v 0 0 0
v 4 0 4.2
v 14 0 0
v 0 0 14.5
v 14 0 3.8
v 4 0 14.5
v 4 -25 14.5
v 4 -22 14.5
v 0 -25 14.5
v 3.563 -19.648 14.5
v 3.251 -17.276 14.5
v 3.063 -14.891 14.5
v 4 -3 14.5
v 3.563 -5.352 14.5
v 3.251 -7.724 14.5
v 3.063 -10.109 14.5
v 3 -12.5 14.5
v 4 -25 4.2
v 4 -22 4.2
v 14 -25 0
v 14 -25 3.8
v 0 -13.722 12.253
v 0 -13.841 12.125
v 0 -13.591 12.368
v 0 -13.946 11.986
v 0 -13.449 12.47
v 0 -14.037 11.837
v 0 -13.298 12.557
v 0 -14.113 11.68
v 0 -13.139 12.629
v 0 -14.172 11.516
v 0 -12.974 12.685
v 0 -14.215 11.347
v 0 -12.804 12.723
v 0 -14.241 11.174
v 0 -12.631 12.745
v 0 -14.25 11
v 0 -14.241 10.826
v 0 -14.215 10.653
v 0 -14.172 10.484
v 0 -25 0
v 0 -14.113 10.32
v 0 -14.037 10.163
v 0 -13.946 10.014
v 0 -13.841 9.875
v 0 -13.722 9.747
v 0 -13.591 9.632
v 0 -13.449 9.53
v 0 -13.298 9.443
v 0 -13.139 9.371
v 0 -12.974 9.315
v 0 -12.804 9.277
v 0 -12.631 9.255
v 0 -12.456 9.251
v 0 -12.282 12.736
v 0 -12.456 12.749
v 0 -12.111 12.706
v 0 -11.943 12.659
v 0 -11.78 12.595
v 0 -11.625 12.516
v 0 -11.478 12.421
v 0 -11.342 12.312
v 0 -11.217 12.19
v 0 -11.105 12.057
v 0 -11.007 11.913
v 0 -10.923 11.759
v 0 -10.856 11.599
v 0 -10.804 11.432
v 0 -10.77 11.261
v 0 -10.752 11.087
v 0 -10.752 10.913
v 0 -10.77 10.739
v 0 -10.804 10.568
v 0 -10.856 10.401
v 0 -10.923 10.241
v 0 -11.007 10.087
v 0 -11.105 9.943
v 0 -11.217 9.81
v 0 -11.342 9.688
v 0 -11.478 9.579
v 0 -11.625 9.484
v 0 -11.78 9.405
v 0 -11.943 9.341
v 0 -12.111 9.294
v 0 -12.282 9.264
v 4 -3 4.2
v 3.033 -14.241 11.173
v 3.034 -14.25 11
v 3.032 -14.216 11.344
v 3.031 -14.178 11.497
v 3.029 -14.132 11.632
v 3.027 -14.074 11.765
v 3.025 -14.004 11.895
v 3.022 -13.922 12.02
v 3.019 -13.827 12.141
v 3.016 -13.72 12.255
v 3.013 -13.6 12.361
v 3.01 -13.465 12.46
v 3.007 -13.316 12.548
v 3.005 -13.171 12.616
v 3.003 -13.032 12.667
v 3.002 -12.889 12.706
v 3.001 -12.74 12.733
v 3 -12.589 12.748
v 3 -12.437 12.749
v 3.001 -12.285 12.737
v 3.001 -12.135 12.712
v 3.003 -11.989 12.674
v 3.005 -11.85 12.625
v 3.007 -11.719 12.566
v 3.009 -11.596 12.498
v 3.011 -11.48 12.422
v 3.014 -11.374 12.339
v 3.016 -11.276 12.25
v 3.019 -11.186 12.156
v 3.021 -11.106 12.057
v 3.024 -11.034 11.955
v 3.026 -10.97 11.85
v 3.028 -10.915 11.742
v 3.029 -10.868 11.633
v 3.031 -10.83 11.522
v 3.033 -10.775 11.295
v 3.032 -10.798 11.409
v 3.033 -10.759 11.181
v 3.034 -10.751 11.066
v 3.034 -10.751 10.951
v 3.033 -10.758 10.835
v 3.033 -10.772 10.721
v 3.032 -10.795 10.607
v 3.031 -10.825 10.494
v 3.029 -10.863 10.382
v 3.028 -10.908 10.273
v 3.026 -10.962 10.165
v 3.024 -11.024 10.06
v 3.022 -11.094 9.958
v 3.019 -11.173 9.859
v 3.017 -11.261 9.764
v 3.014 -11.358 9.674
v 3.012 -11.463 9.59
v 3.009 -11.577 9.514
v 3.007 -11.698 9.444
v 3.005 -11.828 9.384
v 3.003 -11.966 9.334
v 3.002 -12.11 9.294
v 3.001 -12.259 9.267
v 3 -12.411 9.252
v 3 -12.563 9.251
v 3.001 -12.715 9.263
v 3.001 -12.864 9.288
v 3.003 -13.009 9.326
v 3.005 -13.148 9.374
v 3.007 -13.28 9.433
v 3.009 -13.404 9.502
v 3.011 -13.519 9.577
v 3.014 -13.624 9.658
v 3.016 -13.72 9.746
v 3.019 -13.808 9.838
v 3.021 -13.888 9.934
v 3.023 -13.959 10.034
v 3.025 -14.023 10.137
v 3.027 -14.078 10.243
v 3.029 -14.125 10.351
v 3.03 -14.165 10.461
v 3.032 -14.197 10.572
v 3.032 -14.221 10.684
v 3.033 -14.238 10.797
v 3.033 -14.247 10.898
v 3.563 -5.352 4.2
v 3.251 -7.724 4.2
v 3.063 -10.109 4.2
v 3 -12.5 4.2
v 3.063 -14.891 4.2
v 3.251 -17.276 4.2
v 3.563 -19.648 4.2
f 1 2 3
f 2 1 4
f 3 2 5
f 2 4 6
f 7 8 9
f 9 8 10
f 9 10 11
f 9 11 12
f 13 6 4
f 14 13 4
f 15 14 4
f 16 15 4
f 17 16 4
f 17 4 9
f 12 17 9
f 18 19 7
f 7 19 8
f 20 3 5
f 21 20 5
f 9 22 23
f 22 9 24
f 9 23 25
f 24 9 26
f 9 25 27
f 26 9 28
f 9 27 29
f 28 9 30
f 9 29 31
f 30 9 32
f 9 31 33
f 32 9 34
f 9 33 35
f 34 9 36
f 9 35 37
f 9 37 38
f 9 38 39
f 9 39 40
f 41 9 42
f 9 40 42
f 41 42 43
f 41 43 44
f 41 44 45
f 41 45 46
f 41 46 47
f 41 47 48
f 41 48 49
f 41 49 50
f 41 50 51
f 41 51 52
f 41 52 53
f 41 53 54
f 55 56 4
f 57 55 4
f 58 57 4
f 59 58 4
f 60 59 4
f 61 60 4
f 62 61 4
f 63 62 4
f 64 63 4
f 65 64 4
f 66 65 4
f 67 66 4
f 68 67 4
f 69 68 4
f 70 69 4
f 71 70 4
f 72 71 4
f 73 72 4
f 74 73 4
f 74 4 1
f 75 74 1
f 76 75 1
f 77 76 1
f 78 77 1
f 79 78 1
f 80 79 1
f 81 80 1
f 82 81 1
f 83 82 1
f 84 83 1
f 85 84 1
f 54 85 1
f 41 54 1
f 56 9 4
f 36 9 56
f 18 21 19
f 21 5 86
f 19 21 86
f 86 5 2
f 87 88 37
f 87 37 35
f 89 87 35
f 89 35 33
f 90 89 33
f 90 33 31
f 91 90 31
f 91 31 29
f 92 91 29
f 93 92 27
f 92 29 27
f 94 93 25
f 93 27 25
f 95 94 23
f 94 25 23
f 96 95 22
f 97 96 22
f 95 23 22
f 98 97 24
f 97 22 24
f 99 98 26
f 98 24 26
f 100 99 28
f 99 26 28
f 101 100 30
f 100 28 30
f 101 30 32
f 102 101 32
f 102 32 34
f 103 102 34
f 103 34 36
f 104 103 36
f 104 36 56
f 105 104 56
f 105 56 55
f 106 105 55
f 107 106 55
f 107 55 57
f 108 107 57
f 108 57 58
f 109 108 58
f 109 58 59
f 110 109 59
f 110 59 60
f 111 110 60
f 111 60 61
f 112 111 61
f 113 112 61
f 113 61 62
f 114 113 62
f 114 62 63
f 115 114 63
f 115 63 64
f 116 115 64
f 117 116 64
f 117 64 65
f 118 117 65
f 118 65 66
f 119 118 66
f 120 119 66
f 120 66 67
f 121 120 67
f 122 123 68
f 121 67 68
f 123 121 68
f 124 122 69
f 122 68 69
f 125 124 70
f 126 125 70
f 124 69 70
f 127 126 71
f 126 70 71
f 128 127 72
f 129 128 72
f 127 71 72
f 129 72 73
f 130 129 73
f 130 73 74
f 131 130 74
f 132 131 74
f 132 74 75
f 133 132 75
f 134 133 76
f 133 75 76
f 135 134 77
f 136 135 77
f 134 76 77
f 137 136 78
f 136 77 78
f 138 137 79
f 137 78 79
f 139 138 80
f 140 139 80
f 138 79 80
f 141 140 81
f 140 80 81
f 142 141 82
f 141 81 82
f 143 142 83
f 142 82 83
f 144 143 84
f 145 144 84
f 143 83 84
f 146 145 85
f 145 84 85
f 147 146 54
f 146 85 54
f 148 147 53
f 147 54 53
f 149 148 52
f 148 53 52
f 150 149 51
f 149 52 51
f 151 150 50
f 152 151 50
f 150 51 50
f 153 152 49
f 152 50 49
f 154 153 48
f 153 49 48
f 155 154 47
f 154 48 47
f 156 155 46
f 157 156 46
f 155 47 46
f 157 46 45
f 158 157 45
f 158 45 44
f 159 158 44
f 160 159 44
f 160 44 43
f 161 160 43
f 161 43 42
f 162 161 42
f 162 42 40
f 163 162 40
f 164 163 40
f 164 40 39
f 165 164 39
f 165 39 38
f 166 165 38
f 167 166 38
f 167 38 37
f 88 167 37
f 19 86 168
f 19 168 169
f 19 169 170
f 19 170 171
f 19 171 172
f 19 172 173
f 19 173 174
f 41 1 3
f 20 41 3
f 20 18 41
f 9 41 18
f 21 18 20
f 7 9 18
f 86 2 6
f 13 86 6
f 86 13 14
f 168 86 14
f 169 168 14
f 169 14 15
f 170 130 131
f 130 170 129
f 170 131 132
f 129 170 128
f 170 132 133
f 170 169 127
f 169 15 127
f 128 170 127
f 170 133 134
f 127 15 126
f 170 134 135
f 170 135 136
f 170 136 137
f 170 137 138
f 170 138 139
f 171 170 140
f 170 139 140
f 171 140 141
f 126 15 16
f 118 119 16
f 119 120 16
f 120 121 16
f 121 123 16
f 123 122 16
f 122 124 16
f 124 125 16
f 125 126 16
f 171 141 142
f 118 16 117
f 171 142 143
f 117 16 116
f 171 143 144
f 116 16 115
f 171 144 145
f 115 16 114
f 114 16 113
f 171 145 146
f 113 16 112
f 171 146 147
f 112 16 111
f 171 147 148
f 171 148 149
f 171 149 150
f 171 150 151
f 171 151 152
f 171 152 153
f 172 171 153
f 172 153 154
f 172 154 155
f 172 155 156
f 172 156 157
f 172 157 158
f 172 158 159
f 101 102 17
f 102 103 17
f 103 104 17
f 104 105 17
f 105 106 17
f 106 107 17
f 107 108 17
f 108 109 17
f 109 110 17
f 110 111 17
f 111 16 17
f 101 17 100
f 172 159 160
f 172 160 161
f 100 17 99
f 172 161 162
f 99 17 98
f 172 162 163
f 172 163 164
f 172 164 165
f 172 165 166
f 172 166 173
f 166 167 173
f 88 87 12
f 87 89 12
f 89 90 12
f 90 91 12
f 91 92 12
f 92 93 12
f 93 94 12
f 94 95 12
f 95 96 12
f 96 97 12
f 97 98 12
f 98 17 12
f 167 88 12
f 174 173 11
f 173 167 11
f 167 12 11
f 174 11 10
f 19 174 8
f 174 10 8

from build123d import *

# Parameters (mm, degrees)
F1_DEPTH = 25
F2_R     = 1.75
F3_DEPTH = 14.001
F5_DEPTH = 10.3


with BuildPart() as f1:
    # F0 (on Front) → F1 (new body)
    with BuildSketch(Plane.XZ):
        Polygon((0, 14.5), (0, 0), (14, 0), (14, 3.8), (4, 4.2), (4, 14.5), align=None)
    extrude(amount=F1_DEPTH)

    # F2 (on face) → F3 (cut, through all)
    with BuildSketch(Plane(origin=(0, 0, 0), x_dir=(0, -1, 0), z_dir=(-1, 0, 0))):
        with Locations((12.5, 11)):
            Circle(F2_R)
    extrude(amount=-F3_DEPTH, mode=Mode.SUBTRACT)

    # F4 (on face) → F5 (cut, through all)
    with BuildSketch(Plane.XY.offset(14.5)):
        with BuildLine():
            Line((4, -22), (4, -3))
            ThreePointArc((4, -3), (3, -12.5), (4, -22))
        make_face()
    extrude(amount=-F5_DEPTH, mode=Mode.SUBTRACT)


solid = f1.part
